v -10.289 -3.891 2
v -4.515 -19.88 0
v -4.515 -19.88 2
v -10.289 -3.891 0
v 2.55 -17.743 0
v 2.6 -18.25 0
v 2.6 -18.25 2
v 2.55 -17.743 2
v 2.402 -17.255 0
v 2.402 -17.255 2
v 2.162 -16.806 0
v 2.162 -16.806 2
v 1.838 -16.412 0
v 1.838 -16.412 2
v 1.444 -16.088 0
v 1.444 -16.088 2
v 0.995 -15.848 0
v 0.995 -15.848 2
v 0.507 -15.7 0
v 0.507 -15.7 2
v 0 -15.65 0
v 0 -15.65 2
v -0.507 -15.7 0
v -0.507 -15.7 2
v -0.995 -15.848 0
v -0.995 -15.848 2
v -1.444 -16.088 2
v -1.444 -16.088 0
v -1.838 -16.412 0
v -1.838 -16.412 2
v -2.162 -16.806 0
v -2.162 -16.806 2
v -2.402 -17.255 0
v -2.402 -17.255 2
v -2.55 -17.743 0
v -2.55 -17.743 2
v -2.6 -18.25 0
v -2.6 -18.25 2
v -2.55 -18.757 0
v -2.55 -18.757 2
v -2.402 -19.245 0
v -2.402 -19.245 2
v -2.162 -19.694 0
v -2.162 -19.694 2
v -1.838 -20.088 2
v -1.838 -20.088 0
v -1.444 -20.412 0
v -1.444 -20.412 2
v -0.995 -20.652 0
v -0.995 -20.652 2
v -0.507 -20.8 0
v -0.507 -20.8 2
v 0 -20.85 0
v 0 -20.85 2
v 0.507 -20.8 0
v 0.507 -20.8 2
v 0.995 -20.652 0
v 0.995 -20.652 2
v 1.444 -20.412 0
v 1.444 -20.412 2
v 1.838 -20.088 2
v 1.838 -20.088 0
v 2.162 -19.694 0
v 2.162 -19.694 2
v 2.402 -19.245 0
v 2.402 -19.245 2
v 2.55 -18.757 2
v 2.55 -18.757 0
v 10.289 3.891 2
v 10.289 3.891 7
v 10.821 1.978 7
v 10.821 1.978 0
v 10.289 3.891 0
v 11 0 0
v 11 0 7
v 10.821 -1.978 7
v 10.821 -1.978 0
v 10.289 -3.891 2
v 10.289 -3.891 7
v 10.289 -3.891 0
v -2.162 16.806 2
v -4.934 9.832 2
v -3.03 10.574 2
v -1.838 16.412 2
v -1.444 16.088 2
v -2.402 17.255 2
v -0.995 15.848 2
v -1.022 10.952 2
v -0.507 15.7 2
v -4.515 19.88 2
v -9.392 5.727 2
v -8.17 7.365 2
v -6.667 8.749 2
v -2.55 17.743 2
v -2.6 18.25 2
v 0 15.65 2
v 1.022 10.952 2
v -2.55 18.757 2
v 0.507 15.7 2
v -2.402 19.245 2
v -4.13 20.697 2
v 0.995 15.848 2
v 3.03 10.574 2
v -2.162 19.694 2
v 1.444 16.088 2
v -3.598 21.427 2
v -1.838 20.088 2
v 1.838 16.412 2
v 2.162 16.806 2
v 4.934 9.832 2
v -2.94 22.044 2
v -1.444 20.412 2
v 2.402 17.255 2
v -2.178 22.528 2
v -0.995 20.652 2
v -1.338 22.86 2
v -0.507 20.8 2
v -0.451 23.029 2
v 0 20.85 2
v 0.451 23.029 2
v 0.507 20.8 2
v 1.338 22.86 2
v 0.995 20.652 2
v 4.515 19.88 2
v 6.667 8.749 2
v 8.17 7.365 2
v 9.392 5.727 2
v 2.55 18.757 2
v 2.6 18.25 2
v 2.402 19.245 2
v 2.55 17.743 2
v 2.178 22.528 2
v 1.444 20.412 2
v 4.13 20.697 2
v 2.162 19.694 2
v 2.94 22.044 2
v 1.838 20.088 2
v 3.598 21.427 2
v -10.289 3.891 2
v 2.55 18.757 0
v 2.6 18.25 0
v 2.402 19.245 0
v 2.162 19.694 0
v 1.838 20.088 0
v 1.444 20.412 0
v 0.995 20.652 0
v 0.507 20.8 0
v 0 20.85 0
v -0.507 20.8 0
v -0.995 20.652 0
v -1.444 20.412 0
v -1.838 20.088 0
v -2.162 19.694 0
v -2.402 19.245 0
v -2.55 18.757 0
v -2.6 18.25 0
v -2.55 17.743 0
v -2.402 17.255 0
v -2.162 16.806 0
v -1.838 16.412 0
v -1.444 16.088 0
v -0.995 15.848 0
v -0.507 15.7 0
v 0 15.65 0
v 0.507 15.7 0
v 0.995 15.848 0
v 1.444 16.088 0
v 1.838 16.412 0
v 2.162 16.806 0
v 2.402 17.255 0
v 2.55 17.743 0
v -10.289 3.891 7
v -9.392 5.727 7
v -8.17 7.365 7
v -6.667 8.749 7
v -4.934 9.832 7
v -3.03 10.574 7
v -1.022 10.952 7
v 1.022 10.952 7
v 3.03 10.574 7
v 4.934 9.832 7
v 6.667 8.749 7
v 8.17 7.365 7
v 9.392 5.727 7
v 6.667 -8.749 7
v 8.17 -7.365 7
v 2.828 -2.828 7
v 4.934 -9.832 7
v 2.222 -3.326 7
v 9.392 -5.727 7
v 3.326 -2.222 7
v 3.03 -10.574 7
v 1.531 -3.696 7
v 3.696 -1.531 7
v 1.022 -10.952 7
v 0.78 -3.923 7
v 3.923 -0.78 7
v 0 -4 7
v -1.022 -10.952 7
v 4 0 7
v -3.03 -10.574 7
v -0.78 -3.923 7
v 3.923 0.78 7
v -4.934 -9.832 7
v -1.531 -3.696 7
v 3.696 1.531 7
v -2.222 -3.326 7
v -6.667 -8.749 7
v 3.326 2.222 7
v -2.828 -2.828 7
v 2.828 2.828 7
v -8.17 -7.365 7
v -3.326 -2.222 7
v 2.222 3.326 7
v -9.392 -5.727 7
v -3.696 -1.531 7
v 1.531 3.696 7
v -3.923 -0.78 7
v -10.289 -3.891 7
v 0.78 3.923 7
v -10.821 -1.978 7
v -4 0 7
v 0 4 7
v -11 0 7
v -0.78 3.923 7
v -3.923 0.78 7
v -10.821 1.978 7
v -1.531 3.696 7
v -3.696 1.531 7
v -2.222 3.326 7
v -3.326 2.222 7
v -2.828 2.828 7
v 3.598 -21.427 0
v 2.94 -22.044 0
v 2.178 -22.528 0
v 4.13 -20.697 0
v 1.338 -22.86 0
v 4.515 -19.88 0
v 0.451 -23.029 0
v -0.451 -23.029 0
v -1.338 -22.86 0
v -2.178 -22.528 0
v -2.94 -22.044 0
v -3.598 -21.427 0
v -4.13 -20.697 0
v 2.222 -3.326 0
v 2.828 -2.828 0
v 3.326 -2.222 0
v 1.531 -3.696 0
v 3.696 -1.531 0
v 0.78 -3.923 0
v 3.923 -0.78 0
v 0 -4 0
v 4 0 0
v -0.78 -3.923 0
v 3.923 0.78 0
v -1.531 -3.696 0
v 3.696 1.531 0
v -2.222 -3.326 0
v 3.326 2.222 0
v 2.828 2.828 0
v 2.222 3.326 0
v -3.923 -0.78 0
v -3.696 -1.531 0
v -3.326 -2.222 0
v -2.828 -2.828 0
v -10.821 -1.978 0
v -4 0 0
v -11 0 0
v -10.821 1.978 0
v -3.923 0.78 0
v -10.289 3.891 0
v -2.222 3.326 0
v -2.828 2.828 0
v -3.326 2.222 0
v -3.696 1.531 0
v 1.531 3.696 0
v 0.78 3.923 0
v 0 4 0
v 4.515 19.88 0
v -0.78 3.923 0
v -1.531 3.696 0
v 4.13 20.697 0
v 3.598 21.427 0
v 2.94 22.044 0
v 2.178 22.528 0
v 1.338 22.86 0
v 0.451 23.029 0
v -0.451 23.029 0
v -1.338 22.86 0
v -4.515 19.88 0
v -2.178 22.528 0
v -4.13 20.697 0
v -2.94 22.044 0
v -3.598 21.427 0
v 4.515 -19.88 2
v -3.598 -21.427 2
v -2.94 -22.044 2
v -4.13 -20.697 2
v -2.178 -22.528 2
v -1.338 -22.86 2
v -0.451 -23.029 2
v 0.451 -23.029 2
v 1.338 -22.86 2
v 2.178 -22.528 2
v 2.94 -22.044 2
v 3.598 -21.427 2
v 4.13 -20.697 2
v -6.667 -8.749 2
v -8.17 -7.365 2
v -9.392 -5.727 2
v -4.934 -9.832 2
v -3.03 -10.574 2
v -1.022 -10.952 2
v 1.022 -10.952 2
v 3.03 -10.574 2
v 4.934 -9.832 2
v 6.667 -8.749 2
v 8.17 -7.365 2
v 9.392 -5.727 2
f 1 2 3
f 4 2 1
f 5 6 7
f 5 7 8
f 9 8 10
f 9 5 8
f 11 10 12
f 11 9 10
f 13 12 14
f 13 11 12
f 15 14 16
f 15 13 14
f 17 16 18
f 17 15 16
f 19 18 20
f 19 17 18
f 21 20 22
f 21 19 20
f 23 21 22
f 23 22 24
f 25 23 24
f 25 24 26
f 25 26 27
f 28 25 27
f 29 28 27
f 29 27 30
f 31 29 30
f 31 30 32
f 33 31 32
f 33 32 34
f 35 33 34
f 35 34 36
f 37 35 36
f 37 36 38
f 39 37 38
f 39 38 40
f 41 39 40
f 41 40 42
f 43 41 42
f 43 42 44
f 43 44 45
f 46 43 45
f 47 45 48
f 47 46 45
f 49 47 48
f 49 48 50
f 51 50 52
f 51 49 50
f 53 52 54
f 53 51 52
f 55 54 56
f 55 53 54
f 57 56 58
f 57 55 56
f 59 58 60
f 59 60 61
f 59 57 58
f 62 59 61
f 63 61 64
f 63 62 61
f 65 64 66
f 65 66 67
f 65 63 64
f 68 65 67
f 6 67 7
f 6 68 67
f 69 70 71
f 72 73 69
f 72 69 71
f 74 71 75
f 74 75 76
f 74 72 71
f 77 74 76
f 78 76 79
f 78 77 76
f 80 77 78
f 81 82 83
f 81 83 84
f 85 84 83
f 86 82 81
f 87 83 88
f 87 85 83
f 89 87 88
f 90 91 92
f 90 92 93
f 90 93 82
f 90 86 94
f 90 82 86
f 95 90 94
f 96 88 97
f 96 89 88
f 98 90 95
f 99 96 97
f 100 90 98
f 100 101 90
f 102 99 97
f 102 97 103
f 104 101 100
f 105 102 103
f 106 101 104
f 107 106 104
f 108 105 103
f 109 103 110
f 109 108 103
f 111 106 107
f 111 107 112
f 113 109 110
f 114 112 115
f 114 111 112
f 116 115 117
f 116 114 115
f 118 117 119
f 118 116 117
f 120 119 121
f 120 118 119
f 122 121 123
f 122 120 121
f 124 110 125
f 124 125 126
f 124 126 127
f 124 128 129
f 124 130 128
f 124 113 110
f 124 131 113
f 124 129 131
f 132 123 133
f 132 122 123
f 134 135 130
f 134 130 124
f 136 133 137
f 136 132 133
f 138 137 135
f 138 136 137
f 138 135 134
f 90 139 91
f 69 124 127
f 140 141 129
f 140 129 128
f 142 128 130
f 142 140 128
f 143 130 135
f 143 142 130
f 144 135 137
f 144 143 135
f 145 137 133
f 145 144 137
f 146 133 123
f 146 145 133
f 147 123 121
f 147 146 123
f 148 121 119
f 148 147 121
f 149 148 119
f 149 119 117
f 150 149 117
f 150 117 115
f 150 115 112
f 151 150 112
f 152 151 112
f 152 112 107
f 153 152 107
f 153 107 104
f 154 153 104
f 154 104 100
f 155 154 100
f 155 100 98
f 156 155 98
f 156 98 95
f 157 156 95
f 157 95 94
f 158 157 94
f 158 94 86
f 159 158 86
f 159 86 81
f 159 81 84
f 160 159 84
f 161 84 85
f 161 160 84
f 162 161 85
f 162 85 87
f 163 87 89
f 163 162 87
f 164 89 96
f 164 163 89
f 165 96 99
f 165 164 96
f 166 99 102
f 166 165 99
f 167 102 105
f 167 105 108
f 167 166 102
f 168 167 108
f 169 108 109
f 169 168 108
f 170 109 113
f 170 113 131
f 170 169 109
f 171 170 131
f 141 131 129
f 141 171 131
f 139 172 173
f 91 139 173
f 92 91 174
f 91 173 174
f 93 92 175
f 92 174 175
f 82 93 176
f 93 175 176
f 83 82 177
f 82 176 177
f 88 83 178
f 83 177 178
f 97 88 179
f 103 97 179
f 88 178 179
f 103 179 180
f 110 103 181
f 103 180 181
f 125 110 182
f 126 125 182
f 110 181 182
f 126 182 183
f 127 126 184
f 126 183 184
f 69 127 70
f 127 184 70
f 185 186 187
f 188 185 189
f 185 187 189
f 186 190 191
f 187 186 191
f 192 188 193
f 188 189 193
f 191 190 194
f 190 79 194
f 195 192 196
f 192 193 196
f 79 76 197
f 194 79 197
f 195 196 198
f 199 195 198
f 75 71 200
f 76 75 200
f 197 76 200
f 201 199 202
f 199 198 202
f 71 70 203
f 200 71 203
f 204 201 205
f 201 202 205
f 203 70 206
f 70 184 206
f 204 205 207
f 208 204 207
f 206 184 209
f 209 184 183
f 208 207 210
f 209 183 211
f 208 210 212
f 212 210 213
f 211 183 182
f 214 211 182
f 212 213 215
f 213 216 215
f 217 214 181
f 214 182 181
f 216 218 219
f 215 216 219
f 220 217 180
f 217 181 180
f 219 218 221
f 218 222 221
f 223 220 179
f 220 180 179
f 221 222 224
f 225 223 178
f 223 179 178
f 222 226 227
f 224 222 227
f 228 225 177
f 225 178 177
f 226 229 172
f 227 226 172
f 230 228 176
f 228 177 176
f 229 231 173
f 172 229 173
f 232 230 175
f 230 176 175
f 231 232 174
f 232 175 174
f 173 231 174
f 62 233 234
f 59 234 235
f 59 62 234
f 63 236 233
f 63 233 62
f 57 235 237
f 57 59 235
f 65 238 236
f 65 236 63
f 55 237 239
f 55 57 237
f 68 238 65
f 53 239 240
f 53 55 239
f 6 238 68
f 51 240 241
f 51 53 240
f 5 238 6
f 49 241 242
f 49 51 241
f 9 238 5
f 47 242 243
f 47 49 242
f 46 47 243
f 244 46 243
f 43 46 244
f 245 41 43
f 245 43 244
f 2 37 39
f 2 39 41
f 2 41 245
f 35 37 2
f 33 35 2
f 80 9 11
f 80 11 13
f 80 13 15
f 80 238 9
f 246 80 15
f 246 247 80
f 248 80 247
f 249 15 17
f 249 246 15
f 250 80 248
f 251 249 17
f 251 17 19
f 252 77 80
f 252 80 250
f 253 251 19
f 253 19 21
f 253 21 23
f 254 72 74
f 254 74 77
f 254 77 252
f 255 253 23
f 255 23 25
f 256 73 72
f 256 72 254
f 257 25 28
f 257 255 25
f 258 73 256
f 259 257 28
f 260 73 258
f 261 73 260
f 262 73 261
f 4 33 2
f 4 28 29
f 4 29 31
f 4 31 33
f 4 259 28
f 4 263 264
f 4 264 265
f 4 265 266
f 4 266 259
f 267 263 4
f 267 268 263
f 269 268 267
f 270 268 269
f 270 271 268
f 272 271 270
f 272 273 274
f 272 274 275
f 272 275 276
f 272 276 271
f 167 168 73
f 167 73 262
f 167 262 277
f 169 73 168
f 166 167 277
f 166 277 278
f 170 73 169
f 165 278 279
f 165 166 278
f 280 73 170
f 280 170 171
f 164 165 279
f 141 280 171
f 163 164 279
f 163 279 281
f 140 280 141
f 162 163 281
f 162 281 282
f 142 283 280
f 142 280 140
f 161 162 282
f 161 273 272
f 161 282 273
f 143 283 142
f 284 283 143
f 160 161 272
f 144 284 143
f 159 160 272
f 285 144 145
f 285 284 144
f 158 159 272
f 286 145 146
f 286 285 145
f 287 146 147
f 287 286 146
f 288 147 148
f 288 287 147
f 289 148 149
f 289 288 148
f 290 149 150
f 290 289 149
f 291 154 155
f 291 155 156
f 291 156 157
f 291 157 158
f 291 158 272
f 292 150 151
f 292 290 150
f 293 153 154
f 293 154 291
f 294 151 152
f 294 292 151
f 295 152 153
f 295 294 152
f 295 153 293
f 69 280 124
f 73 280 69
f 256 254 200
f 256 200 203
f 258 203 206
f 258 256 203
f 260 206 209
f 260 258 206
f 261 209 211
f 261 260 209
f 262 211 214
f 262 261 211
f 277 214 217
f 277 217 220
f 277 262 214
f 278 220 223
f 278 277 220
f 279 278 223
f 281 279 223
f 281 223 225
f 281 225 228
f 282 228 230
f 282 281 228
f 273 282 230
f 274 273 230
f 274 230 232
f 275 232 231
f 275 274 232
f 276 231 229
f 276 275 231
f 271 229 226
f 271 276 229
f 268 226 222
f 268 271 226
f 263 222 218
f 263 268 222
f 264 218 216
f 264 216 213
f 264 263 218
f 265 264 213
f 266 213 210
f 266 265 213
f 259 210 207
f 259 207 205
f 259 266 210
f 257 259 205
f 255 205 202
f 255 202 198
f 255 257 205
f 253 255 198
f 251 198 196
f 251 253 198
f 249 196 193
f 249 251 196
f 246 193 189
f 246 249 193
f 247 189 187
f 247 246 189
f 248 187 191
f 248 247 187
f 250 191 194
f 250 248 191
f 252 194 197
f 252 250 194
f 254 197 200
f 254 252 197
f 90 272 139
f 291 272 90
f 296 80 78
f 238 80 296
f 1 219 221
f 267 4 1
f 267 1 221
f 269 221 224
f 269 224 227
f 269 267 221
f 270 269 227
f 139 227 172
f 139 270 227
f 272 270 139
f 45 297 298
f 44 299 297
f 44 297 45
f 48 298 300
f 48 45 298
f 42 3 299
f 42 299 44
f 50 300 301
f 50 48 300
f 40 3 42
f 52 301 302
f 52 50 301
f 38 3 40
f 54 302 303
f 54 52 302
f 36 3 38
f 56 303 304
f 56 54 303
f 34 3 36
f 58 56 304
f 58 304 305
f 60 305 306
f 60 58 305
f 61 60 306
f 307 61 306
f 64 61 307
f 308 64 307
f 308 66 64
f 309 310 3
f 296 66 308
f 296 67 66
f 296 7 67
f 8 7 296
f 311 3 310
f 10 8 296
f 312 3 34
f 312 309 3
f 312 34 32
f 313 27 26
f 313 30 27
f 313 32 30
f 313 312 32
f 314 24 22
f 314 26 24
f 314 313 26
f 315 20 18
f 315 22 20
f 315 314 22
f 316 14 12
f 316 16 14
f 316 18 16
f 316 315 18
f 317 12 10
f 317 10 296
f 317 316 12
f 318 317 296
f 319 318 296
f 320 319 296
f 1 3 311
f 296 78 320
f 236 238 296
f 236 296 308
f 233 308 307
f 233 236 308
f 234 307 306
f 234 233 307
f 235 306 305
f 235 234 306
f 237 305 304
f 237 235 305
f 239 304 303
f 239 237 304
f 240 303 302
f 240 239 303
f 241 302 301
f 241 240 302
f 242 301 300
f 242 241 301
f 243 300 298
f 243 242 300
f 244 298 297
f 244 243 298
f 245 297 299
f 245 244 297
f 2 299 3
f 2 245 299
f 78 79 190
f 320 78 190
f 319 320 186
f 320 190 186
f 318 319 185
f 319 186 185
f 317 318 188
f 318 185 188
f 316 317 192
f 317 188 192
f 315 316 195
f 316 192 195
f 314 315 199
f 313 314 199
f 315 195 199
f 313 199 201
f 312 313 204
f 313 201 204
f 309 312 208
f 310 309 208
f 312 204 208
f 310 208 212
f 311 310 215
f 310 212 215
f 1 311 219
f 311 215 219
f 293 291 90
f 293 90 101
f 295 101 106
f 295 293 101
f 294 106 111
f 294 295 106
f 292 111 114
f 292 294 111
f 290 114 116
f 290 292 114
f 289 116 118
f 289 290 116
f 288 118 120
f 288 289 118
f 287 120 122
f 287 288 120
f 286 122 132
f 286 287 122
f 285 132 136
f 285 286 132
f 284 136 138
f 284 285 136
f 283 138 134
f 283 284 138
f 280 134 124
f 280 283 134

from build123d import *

# Parameters (mm, degrees)
CROQUIS1_R              = 4
CROQUIS1_R_2            = 2.6
SALIENTE_EXTRUIR1_DEPTH = 7
CROQUIS2_R              = 2.6
CORTAR_EXTRUIR1_DEPTH   = 5


with BuildPart() as part:
    # Croquis1 → Saliente-Extruir1 (new body)
    with BuildSketch(Plane.XY):
        with BuildLine():
            Line((10.288824315, -3.891027397), (4.514634908, -19.880359362))
            ThreePointArc((4.514634908, -19.880359362), (0, -23.05), (-4.514634908, -19.880359362))
            Line((-4.514634908, -19.880359362), (-10.288824315, -3.891027397))
            ThreePointArc((-10.288824315, -3.891027397), (-11, 0), (-10.288824315, 3.891027397))
            Line((-10.288824315, 3.891027397), (-4.514634908, 19.880359362))
            ThreePointArc((-4.514634908, 19.880359362), (0, 23.05), (4.514634908, 19.880359362))
            Line((4.514634908, 19.880359362), (10.288824315, 3.891027397))
            ThreePointArc((10.288824315, 3.891027397), (11, 0), (10.288824315, -3.891027397))
        make_face()
        Circle(CROQUIS1_R, mode=Mode.SUBTRACT)
        with Locations((0, 18.25)):
            Circle(CROQUIS1_R_2, mode=Mode.SUBTRACT)
        with Locations((0, -18.25)):
            Circle(CROQUIS1_R_2, mode=Mode.SUBTRACT)
    extrude(amount=SALIENTE_EXTRUIR1_DEPTH)

    # Croquis2 → Cortar-Extruir1 (cut)
    with BuildSketch(Plane.XY.offset(7)):
        with BuildLine():
            Line((-4.514634908, 19.880359362), (-10.288824315, 3.891027397))
            ThreePointArc((-10.288824315, 3.891027397), (0, 11), (10.288824315, 3.891027397))
            Line((10.288824315, 3.891027397), (4.514634908, 19.880359362))
            ThreePointArc((4.514634908, 19.880359362), (0, 23.05), (-4.514634908, 19.880359362))
        make_face()
        with Locations((0, 18.25)):
            Circle(CROQUIS2_R, mode=Mode.SUBTRACT)
        with BuildLine():
            ThreePointArc((10.288824315, -3.891027397), (0, -11), (-10.288824315, -3.891027397))
            Line((-10.288824315, -3.891027397), (-4.514634908, -19.880359362))
            ThreePointArc((-4.514634908, -19.880359362), (0, -23.05), (4.514634908, -19.880359362))
            Line((4.514634908, -19.880359362), (10.288824315, -3.891027397))
        make_face()
        with Locations((0, -18.25)):
            Circle(CROQUIS2_R, mode=Mode.SUBTRACT)
    extrude(amount=-CORTAR_EXTRUIR1_DEPTH, mode=Mode.SUBTRACT)


solid = part.part
